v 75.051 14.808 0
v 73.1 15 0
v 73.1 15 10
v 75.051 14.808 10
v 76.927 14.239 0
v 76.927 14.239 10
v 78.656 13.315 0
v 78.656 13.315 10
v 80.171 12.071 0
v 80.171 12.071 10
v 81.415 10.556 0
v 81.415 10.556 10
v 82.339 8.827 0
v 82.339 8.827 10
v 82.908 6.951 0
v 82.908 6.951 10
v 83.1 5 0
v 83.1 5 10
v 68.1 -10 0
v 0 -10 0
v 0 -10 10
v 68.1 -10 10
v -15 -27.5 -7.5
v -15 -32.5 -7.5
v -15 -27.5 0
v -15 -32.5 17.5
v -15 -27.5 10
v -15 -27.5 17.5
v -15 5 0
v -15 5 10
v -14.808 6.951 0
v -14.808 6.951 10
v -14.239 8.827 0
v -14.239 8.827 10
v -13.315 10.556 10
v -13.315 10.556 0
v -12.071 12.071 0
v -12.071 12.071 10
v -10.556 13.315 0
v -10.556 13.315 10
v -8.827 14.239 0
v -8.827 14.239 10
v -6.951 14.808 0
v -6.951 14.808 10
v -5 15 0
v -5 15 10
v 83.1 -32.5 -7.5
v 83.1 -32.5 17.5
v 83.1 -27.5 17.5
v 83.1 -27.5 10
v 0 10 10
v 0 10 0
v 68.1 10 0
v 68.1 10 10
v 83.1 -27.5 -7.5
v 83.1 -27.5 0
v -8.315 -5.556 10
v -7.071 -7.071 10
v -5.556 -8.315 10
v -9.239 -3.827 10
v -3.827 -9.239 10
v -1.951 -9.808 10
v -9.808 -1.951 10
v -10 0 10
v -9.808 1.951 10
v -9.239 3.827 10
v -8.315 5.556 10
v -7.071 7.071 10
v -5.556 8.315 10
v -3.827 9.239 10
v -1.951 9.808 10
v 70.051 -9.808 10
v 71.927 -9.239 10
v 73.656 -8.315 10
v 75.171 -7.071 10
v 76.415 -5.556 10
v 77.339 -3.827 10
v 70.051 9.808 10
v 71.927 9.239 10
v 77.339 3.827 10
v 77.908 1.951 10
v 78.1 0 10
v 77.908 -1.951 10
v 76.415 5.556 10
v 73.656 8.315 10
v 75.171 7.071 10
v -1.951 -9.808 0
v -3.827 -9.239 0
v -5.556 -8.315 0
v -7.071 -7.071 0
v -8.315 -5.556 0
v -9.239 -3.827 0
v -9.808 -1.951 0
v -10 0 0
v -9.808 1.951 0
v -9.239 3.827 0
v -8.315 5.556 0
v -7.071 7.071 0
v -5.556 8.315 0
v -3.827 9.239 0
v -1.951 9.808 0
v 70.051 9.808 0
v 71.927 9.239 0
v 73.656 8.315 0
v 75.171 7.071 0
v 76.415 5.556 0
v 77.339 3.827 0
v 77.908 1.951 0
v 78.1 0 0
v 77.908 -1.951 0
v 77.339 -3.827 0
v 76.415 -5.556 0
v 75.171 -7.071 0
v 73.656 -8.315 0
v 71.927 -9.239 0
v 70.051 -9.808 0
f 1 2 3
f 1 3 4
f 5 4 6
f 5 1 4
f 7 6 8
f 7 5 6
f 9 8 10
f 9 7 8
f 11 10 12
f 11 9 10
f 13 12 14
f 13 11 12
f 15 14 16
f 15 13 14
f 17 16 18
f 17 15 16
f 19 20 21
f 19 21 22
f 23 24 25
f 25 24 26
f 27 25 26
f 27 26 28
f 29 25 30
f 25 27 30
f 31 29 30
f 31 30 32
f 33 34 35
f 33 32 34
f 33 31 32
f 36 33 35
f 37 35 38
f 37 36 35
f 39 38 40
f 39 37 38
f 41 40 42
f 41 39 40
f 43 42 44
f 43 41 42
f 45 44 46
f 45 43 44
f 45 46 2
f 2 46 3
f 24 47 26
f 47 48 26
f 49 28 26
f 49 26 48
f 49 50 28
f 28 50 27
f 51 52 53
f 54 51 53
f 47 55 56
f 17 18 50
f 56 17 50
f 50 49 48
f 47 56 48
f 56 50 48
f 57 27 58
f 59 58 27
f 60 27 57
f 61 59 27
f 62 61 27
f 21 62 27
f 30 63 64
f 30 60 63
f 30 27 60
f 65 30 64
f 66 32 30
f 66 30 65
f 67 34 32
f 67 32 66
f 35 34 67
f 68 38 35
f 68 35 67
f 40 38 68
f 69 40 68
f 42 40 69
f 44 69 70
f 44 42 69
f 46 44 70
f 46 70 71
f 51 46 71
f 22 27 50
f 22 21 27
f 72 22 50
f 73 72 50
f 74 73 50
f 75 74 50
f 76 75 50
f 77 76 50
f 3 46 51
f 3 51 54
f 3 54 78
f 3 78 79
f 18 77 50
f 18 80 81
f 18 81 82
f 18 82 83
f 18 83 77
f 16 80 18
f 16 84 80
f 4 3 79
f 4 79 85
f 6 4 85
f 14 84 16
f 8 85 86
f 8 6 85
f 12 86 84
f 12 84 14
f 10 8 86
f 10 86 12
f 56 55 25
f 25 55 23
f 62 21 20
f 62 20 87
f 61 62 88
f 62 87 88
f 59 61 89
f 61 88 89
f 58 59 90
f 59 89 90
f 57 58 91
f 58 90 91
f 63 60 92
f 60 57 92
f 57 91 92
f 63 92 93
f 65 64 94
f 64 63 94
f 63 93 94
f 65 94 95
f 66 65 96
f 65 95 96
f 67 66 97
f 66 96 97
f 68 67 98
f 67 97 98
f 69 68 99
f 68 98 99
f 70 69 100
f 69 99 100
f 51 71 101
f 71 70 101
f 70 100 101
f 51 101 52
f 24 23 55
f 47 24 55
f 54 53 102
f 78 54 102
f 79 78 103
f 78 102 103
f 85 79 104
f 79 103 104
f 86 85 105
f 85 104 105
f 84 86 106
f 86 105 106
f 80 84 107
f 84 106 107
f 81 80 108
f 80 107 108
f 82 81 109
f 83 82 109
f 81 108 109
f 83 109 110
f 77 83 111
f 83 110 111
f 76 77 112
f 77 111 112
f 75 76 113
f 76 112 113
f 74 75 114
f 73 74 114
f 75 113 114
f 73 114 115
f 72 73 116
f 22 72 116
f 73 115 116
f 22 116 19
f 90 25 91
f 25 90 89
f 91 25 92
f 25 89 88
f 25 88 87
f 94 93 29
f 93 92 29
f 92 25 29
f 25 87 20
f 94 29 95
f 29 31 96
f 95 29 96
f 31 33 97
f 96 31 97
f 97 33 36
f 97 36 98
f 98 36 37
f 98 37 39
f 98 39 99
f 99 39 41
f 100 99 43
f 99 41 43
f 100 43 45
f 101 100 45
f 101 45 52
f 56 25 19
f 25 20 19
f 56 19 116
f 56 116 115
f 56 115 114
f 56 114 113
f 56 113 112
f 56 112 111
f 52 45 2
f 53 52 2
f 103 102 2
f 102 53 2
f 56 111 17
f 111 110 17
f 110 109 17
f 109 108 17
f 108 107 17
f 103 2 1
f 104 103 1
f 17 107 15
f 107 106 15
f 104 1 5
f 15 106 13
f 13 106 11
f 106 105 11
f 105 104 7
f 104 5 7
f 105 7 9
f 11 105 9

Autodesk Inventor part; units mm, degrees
ref_plane "YZ Plane" through (0, 0, 0) normal (1, 0, 0) x (0, 1, 0)
ref_plane "XZ Plane" through (0, 0, 0) normal (0, 1, 0) x (-1, 0, 0)
ref_plane "XY Plane" through (0, 0, 0) normal (0, 0, 1) x (1, 0, 0)
sketch "Sketch1" plane through (0, 0, 0) normal (0, 0, 1) x (1, 0, 0)
  line L0 (0, 0) -> (68.1, 0)
  circle A0 centre (0, 0) radius 10
  circle A1 centre (68.1, 0) radius 10
  line L1 (0, 10) -> (68.1, 10)
  line L2 (0, -10) -> (68.1, -10)
  circle A2 centre (0, 0) radius 15
  circle A3 centre (68.1, 0) radius 15
  line L3 (0, 15) -> (68.1, 15)
  line L4 (68.1, -15) -> (0, -15)
  dimension "d0" = 68.1
  dimension "d1" = 20
  dimension "d2" = 20
  dimension "d3" = 30
  dimension "d4" = 30
extrude "Extrusion1" add sketch "Sketch1" along normal blind 10 contours A0 L2 A2 L1 | A2 L3 A3 L1 | L2 A3 L4 A2 | A3 L2 A1 L1
sketch "Sketch2" plane through (0, 0, 10) normal (0, 0, 1) x (1, 0, 0)
  line L0 (0, 0) -> (0, -32.5) construction
  arc A0 (0, 15) -> (0, -15) centre (0, 0) ccw construction
  line L1 (-15, 0) -> (-15, -32.5) construction
  arc A1 (68.1, -15) -> (68.1, 15) centre (68.1, 0) ccw construction
  line L2 (83.1, 0) -> (83.1, -32.5) construction
  line L3 (-15, -32.5) -> (-15, 15)
  line L4 (-15, 15) -> (83.1, 15)
  line L5 (83.1, 15) -> (83.1, -32.5)
  line L6 (83.1, -32.5) -> (-15, -32.5)
  line L7 (0, 10) -> (68.1, 10) projected
  arc A2 (0, 10) -> (0, -10) centre (0, 0) ccw projected
  line L8 (68.1, -10) -> (0, -10) projected
  arc A3 (68.1, -10) -> (68.1, 10) centre (68.1, 0) ccw projected
  dimension "d7" = 32.5
extrude "Extrusion2" add sketch "Sketch2" against normal blind 10
fillet "Fillet1" radius 10 1 edges at (83.1, 15, 5)
fillet "Fillet2" radius 10 1 edges at (-15, 15, 5)
ref_plane "Work Plane1" through (0, 0, 5) normal (0, 0, 1) x (1, 0, 0)
sketch "Sketch3" plane through (0, 0, 5) normal (0, 0, 1) x (1, 0, 0)
  arc A0 (-5, 15) -> (-15, 5) centre (-5, 5) ccw projected
  line L0 (-5, 15) -> (73.1, 15) projected
  line L1 (83.1, 5) -> (83.1, -32.5) projected
  line L2 (83.1, -32.5) -> (-15, -32.5) projected
  line L3 (-15, -32.5) -> (-15, 5) projected
  line L4 (0, 10) -> (68.1, 10) projected
  arc A1 (0, 10) -> (0, -10) centre (0, 0) ccw projected
  line L5 (68.1, -10) -> (0, -10) projected
  arc A2 (68.1, -10) -> (68.1, 10) centre (68.1, 0) ccw projected
  line L6 (83.1, -32.5) -> (-15, -32.5) projected
  line L7 (-15, -32.5) -> (83.1, -32.5)
  line L8 (83.1, -32.5) -> (83.1, -27.5)
  line L9 (83.1, -27.5) -> (-15, -27.5)
  line L10 (-15, -27.5) -> (-15, -32.5)
  arc A3 (83.1, 5) -> (73.1, 15) centre (73.1, 5) ccw projected
  dimension "d12" = 5
extrude "Extrusion3" add sketch "Sketch3" along normal mid plane 25 contours L9 L1 L2 L3
ref_plane "Work Plane2" through (68.1, -10, 10) normal (1, 0, 0) x (0, 0, -1)
ref_plane "Work Plane3" through (0, -10, 10) normal (1, 0, 0) x (0, 0, -1)
ref_plane "Work Plane4" through (34.05, 5, 10) normal (1, 0, 0) x (0, 0, -1)
properties part number "PistaEslabonPreliminar"
